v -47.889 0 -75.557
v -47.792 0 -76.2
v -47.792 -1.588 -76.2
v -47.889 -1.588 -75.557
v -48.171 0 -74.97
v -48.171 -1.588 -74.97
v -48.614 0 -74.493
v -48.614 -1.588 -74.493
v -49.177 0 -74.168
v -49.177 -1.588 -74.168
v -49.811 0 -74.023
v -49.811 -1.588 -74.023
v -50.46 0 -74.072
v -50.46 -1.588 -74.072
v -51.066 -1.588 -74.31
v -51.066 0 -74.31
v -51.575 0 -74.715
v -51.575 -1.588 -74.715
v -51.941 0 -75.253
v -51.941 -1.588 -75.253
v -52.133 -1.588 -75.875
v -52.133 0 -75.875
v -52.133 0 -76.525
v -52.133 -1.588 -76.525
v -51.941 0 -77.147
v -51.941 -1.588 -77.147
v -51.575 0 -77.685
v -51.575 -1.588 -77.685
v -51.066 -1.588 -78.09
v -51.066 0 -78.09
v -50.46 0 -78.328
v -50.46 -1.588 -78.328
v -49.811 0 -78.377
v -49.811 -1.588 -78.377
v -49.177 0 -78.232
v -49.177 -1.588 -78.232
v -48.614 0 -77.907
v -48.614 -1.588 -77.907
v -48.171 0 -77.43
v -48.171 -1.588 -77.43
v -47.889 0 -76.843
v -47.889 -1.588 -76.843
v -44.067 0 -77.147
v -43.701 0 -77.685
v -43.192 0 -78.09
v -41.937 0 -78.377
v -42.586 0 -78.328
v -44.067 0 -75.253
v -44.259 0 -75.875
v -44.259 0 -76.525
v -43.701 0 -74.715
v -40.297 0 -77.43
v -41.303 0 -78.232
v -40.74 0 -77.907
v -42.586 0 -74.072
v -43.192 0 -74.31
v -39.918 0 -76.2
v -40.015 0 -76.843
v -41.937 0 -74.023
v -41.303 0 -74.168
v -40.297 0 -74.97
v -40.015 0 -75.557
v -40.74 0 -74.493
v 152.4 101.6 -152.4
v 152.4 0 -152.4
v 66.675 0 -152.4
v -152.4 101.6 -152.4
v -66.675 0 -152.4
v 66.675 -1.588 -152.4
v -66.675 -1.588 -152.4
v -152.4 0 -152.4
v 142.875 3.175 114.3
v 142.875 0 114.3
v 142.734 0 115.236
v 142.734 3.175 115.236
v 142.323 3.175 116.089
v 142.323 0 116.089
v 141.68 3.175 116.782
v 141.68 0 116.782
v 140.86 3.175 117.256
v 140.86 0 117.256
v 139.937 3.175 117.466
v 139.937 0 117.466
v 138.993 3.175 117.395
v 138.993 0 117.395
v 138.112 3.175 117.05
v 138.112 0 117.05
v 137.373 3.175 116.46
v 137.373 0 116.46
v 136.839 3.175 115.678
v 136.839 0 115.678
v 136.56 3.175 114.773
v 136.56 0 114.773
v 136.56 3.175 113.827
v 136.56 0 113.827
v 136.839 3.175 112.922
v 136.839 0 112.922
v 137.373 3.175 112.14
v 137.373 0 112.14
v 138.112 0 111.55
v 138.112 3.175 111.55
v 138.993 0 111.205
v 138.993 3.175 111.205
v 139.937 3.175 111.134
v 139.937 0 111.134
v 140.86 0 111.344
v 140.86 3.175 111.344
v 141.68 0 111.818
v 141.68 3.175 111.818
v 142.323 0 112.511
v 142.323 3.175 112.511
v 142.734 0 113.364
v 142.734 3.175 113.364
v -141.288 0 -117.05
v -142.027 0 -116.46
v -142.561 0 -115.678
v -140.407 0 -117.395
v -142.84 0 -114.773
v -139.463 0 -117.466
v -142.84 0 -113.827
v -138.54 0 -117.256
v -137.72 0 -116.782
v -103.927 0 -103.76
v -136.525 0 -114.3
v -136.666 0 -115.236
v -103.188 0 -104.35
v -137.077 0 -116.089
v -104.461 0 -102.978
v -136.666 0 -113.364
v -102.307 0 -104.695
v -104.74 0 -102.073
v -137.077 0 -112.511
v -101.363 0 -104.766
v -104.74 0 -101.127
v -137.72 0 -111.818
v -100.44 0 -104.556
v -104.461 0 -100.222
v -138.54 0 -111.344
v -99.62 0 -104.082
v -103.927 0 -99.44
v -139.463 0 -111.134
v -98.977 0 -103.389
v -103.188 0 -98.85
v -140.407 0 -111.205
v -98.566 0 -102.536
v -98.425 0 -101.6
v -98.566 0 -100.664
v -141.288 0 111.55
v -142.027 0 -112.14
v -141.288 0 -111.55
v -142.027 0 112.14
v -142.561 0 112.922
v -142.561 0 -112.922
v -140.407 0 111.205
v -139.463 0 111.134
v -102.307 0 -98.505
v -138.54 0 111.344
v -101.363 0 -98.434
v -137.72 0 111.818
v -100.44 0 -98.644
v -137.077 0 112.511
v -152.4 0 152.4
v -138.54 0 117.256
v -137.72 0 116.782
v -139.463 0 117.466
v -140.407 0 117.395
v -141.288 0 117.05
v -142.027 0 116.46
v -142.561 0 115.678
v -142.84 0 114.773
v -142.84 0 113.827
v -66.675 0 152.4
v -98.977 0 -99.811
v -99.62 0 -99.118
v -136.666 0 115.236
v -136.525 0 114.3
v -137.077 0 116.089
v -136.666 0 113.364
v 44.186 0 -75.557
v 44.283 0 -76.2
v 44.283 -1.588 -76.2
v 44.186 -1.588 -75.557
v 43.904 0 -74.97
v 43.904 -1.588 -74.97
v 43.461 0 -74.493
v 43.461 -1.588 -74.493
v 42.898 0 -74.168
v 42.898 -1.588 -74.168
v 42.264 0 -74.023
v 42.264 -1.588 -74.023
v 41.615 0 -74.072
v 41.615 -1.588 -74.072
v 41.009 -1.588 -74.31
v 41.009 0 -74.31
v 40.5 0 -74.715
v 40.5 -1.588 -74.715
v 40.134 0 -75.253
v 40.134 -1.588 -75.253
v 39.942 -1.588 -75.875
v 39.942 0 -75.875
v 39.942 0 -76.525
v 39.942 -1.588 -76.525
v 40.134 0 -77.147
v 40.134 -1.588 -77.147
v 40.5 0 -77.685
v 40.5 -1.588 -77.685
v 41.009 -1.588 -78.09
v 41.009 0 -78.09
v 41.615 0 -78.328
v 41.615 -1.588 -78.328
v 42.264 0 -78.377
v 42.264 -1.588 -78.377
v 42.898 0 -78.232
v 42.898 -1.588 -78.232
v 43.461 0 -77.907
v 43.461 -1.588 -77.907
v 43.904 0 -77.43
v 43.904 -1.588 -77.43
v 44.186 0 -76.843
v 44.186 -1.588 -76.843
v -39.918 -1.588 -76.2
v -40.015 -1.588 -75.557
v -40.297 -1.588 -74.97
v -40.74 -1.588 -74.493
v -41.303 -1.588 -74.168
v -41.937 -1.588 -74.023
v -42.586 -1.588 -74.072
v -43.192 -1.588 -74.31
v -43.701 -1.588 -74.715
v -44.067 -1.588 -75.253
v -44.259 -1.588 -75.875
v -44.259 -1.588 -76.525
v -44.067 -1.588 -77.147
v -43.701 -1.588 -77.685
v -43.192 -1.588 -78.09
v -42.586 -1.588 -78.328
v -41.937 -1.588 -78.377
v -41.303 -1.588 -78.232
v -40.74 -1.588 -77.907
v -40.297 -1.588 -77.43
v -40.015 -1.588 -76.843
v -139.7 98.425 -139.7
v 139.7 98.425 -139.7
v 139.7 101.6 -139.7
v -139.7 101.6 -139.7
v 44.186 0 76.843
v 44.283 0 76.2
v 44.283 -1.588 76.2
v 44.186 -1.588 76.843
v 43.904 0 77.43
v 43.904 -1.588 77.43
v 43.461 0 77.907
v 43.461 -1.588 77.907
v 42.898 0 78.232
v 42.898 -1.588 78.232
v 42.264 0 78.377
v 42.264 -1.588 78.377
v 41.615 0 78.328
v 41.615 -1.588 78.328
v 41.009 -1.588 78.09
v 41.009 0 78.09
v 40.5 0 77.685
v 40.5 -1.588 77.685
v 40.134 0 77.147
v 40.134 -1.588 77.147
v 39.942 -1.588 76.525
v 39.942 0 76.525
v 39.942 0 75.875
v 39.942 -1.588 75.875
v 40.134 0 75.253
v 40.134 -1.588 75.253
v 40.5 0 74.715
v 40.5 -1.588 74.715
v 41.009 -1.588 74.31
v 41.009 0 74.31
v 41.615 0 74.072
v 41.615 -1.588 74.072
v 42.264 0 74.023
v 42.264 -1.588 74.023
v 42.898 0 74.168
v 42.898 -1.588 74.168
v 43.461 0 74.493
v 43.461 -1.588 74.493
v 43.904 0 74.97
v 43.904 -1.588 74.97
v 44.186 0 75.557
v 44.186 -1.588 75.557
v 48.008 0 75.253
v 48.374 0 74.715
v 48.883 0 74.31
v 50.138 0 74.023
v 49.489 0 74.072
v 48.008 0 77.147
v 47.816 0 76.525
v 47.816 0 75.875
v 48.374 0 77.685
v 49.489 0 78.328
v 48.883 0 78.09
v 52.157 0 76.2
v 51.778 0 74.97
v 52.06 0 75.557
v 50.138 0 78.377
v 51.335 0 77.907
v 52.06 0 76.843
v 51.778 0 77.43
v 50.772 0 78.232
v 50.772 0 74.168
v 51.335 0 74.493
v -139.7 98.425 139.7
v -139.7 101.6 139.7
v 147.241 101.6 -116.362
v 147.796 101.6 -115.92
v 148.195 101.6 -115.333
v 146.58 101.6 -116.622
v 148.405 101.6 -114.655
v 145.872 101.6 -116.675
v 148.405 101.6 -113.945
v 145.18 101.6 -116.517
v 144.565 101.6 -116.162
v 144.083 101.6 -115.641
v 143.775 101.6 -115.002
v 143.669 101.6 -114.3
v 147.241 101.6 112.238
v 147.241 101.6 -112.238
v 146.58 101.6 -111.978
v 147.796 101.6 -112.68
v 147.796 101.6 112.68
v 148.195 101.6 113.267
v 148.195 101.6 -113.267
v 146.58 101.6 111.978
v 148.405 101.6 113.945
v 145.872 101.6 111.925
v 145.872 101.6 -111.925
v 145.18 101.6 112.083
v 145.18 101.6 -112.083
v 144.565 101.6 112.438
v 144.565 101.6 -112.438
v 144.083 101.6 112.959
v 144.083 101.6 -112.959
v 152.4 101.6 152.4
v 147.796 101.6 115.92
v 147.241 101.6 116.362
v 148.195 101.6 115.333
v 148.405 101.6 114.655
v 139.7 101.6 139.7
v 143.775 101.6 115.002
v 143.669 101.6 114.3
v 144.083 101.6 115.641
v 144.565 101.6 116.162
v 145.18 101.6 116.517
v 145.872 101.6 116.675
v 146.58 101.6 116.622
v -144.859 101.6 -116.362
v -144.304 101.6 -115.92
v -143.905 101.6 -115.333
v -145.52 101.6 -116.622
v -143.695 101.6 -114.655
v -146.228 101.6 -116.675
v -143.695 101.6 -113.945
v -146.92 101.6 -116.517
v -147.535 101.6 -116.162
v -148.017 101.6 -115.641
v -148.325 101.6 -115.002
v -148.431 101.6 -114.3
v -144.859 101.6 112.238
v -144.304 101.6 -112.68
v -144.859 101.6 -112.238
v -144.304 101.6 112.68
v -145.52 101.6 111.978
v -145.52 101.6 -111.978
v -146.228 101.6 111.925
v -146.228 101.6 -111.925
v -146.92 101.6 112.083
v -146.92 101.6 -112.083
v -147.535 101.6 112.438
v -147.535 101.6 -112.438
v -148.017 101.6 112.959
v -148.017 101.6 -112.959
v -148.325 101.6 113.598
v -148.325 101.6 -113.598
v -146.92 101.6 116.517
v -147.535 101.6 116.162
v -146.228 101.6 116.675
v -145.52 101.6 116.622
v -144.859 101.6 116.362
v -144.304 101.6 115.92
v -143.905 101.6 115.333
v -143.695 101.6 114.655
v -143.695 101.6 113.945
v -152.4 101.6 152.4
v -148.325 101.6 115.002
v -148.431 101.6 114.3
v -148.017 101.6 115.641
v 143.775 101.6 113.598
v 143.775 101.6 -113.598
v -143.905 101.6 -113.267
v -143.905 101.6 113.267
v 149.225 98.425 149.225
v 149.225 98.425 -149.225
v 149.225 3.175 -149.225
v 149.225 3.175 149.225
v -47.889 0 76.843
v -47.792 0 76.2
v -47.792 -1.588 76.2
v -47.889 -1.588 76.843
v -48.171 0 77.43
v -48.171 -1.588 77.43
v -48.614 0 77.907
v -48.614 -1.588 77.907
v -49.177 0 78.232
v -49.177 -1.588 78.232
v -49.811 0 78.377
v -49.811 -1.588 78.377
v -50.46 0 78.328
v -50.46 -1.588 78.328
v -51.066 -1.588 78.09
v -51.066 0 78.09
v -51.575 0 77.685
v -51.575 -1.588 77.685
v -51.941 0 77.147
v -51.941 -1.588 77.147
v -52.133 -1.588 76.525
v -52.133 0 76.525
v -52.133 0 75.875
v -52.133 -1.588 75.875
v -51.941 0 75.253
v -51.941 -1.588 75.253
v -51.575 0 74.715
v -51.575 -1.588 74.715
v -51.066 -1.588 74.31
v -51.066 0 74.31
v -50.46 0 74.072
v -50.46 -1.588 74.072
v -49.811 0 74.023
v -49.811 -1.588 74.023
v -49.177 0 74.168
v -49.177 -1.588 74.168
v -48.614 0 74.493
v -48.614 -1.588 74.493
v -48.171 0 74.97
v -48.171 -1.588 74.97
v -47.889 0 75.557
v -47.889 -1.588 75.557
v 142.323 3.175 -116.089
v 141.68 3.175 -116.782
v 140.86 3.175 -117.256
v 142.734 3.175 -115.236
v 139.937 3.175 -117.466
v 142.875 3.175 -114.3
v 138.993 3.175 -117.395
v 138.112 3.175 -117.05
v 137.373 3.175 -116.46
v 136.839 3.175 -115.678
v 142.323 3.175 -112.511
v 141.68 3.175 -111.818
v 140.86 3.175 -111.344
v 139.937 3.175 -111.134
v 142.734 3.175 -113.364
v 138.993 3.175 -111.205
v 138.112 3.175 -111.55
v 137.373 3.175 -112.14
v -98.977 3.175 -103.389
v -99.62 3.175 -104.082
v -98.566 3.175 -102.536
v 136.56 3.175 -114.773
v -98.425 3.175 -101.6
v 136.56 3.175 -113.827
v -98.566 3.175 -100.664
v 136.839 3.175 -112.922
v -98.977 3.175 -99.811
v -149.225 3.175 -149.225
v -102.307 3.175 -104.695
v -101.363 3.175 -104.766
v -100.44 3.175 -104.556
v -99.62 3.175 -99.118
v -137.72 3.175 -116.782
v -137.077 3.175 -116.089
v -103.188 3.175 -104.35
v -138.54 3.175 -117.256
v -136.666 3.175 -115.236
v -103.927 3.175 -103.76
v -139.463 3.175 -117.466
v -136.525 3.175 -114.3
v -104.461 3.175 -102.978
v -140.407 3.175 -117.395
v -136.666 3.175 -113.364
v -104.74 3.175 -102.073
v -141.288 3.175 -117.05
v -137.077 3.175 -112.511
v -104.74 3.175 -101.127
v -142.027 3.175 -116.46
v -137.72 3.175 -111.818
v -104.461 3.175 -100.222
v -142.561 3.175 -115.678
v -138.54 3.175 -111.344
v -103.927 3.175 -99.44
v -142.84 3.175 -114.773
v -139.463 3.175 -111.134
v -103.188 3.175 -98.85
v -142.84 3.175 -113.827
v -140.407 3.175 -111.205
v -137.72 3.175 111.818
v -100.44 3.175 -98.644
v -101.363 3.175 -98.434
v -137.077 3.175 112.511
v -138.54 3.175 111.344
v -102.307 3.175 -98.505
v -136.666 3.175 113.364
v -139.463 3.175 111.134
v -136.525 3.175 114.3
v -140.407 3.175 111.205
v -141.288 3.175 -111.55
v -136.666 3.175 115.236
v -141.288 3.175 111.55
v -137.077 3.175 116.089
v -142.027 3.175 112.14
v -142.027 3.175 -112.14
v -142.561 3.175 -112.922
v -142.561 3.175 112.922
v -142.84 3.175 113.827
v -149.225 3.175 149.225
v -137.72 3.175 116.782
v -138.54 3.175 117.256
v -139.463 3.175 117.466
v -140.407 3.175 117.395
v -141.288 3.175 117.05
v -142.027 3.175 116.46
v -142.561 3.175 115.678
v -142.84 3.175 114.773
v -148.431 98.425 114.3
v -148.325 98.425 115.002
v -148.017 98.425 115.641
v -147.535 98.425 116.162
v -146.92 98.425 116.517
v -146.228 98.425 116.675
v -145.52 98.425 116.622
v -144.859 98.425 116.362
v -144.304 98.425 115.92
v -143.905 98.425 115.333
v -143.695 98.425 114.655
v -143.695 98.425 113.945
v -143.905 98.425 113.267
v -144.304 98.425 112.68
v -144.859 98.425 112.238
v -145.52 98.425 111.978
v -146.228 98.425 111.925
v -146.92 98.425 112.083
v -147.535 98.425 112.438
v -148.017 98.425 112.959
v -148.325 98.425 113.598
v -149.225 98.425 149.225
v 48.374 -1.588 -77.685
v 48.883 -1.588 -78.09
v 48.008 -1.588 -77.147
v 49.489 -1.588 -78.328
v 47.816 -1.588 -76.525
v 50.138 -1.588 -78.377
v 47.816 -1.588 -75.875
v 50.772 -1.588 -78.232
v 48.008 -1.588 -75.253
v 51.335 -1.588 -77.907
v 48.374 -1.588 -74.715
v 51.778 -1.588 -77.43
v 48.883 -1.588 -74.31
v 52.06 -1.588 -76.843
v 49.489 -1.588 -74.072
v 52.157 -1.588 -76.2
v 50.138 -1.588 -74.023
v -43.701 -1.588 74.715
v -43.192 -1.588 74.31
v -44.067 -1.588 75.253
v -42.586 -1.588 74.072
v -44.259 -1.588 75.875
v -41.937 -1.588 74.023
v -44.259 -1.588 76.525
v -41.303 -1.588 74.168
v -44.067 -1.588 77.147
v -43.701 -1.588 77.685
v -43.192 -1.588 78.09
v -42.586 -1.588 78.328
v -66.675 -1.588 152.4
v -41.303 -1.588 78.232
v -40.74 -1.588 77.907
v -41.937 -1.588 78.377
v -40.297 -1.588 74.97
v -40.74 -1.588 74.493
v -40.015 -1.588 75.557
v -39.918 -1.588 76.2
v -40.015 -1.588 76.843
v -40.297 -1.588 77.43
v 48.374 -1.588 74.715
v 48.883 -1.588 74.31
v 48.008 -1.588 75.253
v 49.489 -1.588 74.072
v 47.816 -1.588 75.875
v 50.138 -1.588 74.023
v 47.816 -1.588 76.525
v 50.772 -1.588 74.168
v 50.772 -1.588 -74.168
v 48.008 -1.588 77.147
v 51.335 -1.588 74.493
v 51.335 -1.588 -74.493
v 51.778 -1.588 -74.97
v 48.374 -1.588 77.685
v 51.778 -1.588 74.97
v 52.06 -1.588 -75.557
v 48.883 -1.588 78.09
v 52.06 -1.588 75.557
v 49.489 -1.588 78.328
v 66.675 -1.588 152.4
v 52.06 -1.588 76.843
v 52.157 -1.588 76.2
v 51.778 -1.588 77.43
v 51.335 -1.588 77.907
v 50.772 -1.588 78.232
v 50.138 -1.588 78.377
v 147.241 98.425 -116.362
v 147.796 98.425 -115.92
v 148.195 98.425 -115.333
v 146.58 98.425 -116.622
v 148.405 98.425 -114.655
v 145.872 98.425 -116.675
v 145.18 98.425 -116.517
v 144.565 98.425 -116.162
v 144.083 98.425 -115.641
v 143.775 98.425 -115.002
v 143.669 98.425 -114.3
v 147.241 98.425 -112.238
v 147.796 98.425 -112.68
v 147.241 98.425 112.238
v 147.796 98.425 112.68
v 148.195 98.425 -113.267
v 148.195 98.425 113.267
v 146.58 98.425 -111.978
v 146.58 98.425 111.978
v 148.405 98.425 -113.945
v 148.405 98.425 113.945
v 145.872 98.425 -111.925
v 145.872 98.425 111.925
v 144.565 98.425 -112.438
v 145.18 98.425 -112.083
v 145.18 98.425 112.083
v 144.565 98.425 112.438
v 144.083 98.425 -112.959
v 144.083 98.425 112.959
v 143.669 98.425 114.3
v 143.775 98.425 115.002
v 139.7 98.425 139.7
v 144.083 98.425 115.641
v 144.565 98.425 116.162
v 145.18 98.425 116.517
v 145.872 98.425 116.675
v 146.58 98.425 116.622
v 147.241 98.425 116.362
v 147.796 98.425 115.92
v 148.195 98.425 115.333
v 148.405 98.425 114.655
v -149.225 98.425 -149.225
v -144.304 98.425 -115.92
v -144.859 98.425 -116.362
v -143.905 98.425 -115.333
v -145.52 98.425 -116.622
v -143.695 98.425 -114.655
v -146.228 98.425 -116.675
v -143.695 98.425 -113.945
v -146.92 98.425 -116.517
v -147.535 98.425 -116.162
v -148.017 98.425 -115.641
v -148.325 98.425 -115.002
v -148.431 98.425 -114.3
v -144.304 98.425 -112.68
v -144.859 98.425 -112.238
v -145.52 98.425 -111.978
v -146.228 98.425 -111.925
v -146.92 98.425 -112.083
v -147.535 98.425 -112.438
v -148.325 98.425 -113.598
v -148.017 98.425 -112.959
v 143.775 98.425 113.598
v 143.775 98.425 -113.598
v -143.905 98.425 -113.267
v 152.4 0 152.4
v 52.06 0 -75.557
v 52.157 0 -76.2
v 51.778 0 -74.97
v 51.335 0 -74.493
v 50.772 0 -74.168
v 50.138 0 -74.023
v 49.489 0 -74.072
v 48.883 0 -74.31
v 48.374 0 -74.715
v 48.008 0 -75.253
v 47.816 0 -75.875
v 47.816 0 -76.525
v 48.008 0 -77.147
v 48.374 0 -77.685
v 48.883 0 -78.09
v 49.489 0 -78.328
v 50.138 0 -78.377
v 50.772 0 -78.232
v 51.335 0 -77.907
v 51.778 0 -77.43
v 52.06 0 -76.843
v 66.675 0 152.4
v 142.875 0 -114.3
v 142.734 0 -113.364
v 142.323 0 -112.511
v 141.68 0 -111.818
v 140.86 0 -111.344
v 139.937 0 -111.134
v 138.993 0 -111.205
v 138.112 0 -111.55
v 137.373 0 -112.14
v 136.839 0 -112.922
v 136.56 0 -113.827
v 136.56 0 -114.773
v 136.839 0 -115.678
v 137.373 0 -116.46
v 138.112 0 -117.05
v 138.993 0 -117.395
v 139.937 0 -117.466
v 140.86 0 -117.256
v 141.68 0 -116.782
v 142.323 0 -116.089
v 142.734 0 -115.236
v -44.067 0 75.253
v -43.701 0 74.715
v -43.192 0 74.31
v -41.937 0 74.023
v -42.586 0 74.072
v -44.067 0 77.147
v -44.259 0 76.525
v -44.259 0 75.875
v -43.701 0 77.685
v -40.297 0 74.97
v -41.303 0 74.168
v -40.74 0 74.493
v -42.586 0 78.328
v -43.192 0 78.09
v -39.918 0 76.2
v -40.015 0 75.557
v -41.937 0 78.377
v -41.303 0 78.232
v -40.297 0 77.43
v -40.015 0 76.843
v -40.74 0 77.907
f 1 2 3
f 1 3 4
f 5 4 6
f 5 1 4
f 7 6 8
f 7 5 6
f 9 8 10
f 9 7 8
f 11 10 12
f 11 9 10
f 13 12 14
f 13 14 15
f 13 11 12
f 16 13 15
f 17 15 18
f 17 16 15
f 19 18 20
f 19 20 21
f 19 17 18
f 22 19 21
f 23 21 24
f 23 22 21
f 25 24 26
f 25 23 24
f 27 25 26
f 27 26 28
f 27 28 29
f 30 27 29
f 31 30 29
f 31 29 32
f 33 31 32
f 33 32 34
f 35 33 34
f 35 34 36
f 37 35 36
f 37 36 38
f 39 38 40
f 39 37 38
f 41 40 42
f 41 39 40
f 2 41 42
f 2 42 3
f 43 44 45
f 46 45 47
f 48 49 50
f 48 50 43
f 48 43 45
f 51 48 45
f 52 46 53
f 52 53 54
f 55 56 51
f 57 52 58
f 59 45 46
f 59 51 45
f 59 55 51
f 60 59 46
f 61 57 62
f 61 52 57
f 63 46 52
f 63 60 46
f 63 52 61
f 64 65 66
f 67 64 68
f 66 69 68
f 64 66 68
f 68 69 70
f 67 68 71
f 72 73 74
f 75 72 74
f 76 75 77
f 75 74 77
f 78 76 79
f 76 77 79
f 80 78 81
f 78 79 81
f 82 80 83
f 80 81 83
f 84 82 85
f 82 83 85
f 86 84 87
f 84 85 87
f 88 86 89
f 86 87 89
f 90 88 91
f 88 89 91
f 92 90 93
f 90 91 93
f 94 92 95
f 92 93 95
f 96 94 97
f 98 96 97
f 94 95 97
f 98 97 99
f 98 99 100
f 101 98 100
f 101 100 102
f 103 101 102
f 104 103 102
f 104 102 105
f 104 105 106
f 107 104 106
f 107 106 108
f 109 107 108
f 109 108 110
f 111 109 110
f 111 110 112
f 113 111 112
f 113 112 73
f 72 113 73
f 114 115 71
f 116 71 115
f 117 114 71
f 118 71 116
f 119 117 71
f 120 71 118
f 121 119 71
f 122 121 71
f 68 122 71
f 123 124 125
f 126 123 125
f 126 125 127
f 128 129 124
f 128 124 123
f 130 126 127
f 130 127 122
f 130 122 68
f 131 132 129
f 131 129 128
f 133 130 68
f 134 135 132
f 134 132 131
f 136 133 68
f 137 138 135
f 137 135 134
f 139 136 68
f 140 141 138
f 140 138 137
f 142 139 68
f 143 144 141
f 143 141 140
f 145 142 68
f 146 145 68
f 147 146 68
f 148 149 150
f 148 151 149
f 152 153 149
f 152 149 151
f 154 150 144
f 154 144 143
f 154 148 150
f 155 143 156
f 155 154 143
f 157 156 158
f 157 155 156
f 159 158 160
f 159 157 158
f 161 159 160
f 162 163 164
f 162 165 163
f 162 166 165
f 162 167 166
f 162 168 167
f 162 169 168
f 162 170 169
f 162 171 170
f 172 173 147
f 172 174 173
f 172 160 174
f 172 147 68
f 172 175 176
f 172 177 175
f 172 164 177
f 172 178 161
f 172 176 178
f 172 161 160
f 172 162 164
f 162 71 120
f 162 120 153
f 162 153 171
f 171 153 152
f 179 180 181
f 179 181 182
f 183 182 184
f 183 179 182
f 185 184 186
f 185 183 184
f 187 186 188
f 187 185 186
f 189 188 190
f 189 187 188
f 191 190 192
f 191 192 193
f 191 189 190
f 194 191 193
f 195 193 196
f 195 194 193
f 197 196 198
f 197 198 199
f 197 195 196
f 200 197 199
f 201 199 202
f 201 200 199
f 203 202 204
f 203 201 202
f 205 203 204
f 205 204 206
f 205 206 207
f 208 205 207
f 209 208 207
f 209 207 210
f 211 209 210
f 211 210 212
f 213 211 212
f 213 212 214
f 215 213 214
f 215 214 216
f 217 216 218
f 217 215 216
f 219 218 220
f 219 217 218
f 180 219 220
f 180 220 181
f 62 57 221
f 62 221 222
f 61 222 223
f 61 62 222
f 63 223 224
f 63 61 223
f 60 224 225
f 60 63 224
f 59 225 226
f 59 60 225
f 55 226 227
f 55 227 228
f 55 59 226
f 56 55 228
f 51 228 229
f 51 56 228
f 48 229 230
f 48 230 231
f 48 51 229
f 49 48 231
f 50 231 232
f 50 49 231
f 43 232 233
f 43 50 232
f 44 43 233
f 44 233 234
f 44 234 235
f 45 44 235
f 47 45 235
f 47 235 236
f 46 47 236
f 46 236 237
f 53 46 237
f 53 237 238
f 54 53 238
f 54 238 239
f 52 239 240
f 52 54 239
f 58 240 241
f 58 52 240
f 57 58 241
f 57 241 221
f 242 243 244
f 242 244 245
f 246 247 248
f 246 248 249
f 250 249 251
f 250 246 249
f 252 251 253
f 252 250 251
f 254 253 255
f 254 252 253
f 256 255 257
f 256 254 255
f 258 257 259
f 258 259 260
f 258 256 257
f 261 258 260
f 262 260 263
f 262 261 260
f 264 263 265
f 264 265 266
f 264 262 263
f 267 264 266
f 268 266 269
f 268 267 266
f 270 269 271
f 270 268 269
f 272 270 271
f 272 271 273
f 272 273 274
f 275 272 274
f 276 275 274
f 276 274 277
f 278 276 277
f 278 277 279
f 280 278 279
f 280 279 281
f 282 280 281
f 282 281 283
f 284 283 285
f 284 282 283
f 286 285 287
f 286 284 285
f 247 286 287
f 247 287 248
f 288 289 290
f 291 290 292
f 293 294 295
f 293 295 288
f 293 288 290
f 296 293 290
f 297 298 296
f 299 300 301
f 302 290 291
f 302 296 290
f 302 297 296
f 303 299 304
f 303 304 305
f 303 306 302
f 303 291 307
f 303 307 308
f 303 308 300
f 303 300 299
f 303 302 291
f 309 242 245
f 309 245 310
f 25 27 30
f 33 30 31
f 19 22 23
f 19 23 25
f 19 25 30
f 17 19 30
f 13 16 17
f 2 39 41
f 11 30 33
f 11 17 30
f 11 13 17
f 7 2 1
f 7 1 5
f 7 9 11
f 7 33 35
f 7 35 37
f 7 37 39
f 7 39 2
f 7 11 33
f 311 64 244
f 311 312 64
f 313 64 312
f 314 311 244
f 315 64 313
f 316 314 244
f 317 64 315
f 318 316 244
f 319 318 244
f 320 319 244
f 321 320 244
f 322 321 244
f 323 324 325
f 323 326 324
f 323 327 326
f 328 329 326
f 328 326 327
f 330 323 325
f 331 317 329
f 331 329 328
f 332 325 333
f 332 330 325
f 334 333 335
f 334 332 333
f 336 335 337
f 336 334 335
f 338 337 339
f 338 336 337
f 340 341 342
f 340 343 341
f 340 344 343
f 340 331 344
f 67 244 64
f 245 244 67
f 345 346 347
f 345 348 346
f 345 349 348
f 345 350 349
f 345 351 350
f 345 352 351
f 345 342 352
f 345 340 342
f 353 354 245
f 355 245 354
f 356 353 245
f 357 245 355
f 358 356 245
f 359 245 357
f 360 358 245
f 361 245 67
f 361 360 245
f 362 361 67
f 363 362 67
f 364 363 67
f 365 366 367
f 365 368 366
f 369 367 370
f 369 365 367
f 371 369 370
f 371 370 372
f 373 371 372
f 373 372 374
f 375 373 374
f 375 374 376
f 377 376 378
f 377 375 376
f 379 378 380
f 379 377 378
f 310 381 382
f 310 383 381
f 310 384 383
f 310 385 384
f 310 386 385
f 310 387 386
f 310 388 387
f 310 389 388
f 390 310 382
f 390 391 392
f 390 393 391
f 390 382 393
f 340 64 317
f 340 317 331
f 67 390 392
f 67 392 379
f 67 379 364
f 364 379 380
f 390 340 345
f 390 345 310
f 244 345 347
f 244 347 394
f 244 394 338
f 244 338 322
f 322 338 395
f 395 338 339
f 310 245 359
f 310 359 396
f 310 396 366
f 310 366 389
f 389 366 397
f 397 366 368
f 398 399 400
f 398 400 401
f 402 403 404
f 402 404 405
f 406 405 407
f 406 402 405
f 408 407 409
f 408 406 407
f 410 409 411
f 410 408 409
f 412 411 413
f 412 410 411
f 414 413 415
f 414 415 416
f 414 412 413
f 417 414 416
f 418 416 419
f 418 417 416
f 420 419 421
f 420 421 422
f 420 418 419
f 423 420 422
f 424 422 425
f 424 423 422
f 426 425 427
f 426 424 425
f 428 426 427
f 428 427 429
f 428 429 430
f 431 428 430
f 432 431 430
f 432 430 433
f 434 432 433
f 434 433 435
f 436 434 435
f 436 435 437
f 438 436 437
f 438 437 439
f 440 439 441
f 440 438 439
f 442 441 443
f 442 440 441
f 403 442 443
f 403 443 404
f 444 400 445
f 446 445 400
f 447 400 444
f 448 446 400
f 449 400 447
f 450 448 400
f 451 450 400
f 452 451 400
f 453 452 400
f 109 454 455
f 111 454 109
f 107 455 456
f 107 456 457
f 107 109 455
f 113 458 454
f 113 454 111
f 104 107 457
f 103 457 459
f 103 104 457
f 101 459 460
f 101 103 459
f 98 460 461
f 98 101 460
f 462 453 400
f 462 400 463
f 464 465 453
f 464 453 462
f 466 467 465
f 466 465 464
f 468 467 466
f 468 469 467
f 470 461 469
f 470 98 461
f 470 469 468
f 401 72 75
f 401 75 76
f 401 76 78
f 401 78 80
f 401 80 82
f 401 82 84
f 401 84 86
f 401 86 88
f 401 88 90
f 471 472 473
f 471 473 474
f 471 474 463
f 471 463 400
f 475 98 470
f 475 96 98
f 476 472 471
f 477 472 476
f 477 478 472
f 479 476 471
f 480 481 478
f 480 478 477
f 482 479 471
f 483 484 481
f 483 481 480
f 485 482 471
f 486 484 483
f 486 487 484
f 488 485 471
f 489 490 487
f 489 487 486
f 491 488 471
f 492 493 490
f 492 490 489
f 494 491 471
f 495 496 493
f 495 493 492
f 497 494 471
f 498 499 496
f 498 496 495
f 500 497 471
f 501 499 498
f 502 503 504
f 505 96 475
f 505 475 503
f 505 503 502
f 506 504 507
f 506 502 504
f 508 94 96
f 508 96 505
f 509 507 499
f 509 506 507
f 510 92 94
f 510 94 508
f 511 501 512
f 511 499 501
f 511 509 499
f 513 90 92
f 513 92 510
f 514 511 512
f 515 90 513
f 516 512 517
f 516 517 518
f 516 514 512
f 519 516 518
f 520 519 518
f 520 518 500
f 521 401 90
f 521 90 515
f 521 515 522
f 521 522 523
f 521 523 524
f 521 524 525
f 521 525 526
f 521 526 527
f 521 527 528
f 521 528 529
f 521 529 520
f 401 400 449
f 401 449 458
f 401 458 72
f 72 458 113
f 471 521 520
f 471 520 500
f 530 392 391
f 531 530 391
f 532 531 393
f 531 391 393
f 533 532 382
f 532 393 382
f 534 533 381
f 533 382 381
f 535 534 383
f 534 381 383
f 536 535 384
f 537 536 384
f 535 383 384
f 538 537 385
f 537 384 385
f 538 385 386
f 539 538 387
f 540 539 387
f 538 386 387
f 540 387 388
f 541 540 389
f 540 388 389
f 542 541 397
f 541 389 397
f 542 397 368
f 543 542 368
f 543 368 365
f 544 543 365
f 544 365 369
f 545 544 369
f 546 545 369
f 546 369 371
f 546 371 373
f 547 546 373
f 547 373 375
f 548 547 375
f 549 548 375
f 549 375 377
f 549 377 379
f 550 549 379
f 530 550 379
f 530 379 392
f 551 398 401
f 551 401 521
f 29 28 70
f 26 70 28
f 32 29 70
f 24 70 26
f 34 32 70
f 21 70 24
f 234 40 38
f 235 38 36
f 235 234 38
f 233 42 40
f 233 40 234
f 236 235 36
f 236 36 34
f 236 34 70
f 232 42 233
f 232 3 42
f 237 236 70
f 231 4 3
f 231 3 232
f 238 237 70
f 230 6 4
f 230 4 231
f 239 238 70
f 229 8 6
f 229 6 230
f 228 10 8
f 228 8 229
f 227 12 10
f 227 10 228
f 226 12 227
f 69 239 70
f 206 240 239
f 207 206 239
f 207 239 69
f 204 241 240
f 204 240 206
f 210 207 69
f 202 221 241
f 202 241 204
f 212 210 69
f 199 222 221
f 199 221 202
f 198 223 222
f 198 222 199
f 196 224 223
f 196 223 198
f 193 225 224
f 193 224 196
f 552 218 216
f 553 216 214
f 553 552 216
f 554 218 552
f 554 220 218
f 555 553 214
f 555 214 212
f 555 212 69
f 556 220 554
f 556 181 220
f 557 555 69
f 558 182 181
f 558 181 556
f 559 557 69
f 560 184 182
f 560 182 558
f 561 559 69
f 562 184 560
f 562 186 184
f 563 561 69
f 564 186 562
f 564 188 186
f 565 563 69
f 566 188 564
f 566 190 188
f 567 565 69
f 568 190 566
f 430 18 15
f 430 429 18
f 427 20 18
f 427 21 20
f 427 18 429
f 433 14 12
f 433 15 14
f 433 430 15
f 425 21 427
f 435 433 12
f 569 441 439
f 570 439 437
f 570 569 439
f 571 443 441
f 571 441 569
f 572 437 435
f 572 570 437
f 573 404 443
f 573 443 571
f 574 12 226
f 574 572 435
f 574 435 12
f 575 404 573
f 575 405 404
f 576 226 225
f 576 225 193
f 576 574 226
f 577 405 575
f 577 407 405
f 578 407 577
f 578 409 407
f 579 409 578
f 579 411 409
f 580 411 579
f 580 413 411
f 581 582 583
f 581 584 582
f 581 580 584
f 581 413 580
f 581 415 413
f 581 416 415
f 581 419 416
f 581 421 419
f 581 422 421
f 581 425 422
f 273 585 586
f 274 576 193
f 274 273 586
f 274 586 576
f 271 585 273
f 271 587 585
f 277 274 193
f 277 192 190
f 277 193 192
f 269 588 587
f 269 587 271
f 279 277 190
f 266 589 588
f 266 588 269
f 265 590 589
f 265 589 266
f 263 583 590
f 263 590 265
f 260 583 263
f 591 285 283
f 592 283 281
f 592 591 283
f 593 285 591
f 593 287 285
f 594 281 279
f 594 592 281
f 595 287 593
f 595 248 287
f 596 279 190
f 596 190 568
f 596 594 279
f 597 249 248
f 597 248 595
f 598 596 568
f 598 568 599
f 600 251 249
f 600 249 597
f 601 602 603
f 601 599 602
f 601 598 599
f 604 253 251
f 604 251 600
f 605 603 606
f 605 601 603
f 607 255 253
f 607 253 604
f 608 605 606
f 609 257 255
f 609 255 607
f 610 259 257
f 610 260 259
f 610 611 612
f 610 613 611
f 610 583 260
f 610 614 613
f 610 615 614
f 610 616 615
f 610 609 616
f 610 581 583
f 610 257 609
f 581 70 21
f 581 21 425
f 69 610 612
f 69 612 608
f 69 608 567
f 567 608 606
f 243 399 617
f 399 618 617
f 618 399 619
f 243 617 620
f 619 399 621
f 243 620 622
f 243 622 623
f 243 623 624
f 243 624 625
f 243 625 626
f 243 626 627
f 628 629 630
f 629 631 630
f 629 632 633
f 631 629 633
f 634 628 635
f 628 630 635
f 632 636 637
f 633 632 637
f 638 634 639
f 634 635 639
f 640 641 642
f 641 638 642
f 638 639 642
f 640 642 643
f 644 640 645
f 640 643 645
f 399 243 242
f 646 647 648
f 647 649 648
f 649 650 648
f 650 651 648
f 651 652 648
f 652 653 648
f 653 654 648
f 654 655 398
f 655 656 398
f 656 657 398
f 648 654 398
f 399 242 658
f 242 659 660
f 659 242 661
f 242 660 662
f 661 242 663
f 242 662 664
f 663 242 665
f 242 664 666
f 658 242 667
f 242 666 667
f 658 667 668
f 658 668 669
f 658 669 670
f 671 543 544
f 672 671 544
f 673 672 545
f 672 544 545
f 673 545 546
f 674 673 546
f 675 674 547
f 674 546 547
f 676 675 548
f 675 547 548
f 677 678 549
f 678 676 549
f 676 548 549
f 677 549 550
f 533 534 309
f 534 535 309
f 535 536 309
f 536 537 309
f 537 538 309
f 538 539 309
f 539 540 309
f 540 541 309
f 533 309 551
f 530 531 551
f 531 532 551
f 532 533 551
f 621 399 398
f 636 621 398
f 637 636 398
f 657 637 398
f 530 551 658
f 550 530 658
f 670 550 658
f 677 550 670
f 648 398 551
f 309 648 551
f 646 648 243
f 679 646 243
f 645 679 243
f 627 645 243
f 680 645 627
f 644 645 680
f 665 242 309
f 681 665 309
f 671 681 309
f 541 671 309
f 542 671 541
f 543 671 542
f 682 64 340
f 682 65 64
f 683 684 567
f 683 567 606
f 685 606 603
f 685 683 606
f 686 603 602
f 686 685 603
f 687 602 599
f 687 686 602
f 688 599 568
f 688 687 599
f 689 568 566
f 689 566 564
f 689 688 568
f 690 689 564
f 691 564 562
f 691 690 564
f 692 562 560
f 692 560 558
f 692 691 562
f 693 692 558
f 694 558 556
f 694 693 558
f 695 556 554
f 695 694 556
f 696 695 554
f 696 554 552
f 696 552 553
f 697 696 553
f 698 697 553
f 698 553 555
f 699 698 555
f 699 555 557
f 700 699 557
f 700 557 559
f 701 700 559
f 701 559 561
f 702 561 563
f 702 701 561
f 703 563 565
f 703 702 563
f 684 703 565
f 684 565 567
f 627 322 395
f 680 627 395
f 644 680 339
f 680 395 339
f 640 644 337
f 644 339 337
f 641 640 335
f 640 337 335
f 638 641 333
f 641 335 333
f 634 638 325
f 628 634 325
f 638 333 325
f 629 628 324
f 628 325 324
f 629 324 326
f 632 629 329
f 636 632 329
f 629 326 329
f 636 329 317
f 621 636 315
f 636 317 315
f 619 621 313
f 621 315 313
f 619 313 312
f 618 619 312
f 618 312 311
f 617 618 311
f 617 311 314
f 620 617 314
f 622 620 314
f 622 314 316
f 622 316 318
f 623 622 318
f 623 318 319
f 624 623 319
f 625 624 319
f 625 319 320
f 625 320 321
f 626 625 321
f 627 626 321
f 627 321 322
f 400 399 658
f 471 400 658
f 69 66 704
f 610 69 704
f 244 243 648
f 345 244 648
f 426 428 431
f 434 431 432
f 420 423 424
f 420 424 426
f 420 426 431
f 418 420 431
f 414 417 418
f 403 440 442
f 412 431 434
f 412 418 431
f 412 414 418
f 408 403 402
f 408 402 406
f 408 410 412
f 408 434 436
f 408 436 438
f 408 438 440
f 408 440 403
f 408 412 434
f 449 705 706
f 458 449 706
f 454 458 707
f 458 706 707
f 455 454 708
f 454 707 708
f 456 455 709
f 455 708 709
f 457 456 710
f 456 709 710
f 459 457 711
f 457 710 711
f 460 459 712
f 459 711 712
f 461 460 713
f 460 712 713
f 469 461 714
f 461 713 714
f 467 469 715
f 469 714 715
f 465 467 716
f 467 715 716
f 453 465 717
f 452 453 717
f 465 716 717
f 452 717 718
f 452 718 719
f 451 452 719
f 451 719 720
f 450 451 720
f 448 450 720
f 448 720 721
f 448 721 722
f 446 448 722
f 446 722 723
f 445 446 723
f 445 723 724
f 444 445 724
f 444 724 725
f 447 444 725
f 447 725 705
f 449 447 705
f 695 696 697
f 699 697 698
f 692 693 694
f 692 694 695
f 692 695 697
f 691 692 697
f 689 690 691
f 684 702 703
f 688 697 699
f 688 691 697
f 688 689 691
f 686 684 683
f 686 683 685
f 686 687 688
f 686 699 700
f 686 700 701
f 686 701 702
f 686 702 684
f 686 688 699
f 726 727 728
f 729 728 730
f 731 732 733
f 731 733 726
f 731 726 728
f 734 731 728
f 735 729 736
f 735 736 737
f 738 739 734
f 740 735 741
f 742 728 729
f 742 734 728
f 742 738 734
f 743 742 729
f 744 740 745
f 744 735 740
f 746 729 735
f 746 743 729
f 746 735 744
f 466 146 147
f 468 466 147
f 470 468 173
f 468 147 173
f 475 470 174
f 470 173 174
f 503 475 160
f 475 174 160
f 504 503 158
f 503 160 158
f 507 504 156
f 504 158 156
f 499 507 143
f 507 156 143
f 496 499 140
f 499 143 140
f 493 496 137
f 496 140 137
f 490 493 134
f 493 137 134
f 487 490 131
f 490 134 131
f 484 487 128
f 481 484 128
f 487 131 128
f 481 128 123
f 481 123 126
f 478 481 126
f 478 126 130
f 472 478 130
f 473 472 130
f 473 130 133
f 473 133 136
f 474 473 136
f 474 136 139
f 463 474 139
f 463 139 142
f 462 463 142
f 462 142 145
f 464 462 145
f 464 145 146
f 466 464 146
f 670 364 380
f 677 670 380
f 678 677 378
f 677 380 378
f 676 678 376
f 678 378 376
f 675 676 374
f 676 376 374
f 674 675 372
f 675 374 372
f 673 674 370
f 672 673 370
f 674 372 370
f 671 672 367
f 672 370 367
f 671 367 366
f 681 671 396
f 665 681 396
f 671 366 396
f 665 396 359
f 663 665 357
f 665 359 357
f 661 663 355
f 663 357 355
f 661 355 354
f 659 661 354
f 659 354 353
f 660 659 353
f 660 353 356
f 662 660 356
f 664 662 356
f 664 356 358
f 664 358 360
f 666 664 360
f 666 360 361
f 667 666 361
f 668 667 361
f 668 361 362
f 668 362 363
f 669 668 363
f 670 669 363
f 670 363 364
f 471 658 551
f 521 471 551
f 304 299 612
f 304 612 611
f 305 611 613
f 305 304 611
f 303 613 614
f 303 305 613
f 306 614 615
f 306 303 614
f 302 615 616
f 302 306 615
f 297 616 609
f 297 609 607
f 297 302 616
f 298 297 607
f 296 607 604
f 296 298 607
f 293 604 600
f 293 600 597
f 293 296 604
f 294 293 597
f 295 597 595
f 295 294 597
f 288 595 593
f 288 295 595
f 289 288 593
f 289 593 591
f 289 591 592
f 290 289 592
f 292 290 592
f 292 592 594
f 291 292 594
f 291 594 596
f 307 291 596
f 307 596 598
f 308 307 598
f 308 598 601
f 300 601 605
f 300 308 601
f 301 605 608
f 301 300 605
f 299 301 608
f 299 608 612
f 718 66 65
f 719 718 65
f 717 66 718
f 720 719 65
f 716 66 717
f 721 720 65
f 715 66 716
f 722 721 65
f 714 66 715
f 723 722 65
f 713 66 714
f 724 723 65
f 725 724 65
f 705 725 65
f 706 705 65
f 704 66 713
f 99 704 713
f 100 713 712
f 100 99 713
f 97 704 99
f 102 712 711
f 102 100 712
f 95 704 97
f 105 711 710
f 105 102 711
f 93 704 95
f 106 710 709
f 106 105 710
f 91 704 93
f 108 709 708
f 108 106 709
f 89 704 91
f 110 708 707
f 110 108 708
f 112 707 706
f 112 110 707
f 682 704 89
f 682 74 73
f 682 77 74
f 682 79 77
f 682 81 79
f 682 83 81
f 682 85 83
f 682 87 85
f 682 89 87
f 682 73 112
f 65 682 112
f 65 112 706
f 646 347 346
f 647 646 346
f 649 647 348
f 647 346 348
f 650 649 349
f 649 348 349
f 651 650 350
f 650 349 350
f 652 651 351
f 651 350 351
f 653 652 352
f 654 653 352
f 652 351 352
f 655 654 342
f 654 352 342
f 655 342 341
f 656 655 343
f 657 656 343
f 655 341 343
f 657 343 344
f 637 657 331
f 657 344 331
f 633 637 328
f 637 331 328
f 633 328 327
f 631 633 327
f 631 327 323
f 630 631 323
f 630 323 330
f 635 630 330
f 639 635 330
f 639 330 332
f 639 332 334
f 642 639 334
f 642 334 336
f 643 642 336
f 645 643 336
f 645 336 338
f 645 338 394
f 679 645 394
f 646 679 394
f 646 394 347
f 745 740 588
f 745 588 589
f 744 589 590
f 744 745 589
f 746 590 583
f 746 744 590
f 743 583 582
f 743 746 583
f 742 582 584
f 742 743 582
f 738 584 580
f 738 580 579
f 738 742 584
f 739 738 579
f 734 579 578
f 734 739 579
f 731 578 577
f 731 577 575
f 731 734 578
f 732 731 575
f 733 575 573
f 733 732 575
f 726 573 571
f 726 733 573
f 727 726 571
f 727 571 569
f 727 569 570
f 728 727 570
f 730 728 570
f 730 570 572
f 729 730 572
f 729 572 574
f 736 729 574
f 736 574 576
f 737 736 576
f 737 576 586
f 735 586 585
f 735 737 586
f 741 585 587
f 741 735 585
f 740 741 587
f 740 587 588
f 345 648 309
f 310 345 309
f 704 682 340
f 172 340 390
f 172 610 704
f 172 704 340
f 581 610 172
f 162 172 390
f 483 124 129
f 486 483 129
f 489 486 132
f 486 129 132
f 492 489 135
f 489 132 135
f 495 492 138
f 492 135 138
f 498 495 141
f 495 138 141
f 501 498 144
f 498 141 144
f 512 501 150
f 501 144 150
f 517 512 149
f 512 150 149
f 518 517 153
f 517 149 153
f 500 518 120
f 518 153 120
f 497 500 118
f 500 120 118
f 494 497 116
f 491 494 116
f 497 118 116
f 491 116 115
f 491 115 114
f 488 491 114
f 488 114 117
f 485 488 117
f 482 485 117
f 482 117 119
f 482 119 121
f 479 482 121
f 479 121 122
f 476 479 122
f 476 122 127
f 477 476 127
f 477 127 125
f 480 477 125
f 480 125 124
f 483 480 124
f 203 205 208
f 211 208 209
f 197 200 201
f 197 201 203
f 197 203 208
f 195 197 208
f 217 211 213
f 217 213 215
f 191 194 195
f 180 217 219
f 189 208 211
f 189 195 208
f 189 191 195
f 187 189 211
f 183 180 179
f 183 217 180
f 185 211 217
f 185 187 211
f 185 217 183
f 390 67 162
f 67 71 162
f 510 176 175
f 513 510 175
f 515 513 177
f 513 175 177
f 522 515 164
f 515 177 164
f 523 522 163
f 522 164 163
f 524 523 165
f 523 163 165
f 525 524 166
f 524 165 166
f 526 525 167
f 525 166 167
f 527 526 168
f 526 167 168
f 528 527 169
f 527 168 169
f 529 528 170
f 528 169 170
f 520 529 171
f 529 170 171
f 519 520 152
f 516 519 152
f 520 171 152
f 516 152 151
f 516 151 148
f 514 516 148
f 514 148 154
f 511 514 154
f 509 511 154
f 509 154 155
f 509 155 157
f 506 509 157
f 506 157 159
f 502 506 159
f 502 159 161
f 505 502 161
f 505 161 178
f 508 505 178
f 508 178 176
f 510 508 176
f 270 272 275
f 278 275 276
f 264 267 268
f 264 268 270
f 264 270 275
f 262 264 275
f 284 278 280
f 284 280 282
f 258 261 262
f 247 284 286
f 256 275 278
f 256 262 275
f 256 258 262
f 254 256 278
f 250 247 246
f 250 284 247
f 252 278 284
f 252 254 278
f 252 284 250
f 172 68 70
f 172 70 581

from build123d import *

# Parameters (mm, degrees)
F0_W     = 133.35
F0_H     = 304.8
F0_R     = 2.182813
F1_DEPTH = 1.5875
F2_W     = 304.8
F2_H     = 304.8
F2_R     = 3.175
F3_DEPTH = 98.425
F4_W     = 298.45
F4_H     = 298.45
F5_DEPTH = 95.25
F6_W     = 304.8
F6_H     = 304.8
F6_W_2   = 279.4
F6_H_2   = 279.4
F7_DEPTH = 3.175
F8_R     = 2.38125
F9_DEPTH = 25.4


with BuildPart() as f1:
    # F0 (on Front) → F1 (new body)
    with BuildSketch(Plane.XZ):
        Rectangle(F0_W, F0_H)
        with Locations((-49.9745, -76.2)):
            Circle(F0_R, mode=Mode.SUBTRACT)
        with Locations((-42.1005, -76.2)):
            Circle(F0_R, mode=Mode.SUBTRACT)
        with Locations((42.1005, -76.2)):
            Circle(F0_R, mode=Mode.SUBTRACT)
        with Locations((49.9745, -76.2)):
            Circle(F0_R, mode=Mode.SUBTRACT)
        with Locations((-49.9745, 76.2)):
            Circle(F0_R, mode=Mode.SUBTRACT)
        with Locations((-42.1005, 76.2)):
            Circle(F0_R, mode=Mode.SUBTRACT)
        with Locations((42.1005, 76.2)):
            Circle(F0_R, mode=Mode.SUBTRACT)
        with Locations((49.9745, 76.2)):
            Circle(F0_R, mode=Mode.SUBTRACT)
    extrude(amount=F1_DEPTH)

    # F2 (on Front) → F3 (join)
    with BuildSketch(Plane.XZ):
        Rectangle(F2_W, F2_H)
        with Locations((-139.7, -114.3)):
            Circle(F2_R, mode=Mode.SUBTRACT)
        with Locations((-101.6, -101.6)):
            Circle(F2_R, mode=Mode.SUBTRACT)
        with Locations((139.7, -114.3)):
            Circle(F2_R, mode=Mode.SUBTRACT)
        with Locations((-139.7, 114.3)):
            Circle(F2_R, mode=Mode.SUBTRACT)
        with Locations((139.7, 114.3)):
            Circle(F2_R, mode=Mode.SUBTRACT)
    extrude(amount=-F3_DEPTH)

    # F4 (on face) → F5 (cut)
    with BuildSketch(Plane(origin=(0, 98.425, 0), x_dir=(-1, 0, 0), z_dir=(0, 1, 0))):
        Rectangle(F4_W, F4_H)
    extrude(amount=-F5_DEPTH, mode=Mode.SUBTRACT)

    # F6 (on face) → F7 (join)
    with BuildSketch(Plane(origin=(0, 98.425, 0), x_dir=(-1, 0, 0), z_dir=(0, 1, 0))):
        Rectangle(F6_W, F6_H)
        Rectangle(F6_W_2, F6_H_2, mode=Mode.SUBTRACT)
    extrude(amount=F7_DEPTH)

    # F8 (on face) → F9 (cut)
    with BuildSketch(Plane(origin=(0, 101.6, 0), x_dir=(-1, 0, 0), z_dir=(0, 1, 0))):
        with Locations((-146.05, 114.3)):
            Circle(F8_R)
        with Locations((146.05, 114.3)):
            Circle(F8_R)
        with Locations((146.05, -114.3)):
            Circle(F8_R)
        with Locations((-146.05, -114.3)):
            Circle(F8_R)
    extrude(amount=-F9_DEPTH, mode=Mode.SUBTRACT)


solid = f1.part
